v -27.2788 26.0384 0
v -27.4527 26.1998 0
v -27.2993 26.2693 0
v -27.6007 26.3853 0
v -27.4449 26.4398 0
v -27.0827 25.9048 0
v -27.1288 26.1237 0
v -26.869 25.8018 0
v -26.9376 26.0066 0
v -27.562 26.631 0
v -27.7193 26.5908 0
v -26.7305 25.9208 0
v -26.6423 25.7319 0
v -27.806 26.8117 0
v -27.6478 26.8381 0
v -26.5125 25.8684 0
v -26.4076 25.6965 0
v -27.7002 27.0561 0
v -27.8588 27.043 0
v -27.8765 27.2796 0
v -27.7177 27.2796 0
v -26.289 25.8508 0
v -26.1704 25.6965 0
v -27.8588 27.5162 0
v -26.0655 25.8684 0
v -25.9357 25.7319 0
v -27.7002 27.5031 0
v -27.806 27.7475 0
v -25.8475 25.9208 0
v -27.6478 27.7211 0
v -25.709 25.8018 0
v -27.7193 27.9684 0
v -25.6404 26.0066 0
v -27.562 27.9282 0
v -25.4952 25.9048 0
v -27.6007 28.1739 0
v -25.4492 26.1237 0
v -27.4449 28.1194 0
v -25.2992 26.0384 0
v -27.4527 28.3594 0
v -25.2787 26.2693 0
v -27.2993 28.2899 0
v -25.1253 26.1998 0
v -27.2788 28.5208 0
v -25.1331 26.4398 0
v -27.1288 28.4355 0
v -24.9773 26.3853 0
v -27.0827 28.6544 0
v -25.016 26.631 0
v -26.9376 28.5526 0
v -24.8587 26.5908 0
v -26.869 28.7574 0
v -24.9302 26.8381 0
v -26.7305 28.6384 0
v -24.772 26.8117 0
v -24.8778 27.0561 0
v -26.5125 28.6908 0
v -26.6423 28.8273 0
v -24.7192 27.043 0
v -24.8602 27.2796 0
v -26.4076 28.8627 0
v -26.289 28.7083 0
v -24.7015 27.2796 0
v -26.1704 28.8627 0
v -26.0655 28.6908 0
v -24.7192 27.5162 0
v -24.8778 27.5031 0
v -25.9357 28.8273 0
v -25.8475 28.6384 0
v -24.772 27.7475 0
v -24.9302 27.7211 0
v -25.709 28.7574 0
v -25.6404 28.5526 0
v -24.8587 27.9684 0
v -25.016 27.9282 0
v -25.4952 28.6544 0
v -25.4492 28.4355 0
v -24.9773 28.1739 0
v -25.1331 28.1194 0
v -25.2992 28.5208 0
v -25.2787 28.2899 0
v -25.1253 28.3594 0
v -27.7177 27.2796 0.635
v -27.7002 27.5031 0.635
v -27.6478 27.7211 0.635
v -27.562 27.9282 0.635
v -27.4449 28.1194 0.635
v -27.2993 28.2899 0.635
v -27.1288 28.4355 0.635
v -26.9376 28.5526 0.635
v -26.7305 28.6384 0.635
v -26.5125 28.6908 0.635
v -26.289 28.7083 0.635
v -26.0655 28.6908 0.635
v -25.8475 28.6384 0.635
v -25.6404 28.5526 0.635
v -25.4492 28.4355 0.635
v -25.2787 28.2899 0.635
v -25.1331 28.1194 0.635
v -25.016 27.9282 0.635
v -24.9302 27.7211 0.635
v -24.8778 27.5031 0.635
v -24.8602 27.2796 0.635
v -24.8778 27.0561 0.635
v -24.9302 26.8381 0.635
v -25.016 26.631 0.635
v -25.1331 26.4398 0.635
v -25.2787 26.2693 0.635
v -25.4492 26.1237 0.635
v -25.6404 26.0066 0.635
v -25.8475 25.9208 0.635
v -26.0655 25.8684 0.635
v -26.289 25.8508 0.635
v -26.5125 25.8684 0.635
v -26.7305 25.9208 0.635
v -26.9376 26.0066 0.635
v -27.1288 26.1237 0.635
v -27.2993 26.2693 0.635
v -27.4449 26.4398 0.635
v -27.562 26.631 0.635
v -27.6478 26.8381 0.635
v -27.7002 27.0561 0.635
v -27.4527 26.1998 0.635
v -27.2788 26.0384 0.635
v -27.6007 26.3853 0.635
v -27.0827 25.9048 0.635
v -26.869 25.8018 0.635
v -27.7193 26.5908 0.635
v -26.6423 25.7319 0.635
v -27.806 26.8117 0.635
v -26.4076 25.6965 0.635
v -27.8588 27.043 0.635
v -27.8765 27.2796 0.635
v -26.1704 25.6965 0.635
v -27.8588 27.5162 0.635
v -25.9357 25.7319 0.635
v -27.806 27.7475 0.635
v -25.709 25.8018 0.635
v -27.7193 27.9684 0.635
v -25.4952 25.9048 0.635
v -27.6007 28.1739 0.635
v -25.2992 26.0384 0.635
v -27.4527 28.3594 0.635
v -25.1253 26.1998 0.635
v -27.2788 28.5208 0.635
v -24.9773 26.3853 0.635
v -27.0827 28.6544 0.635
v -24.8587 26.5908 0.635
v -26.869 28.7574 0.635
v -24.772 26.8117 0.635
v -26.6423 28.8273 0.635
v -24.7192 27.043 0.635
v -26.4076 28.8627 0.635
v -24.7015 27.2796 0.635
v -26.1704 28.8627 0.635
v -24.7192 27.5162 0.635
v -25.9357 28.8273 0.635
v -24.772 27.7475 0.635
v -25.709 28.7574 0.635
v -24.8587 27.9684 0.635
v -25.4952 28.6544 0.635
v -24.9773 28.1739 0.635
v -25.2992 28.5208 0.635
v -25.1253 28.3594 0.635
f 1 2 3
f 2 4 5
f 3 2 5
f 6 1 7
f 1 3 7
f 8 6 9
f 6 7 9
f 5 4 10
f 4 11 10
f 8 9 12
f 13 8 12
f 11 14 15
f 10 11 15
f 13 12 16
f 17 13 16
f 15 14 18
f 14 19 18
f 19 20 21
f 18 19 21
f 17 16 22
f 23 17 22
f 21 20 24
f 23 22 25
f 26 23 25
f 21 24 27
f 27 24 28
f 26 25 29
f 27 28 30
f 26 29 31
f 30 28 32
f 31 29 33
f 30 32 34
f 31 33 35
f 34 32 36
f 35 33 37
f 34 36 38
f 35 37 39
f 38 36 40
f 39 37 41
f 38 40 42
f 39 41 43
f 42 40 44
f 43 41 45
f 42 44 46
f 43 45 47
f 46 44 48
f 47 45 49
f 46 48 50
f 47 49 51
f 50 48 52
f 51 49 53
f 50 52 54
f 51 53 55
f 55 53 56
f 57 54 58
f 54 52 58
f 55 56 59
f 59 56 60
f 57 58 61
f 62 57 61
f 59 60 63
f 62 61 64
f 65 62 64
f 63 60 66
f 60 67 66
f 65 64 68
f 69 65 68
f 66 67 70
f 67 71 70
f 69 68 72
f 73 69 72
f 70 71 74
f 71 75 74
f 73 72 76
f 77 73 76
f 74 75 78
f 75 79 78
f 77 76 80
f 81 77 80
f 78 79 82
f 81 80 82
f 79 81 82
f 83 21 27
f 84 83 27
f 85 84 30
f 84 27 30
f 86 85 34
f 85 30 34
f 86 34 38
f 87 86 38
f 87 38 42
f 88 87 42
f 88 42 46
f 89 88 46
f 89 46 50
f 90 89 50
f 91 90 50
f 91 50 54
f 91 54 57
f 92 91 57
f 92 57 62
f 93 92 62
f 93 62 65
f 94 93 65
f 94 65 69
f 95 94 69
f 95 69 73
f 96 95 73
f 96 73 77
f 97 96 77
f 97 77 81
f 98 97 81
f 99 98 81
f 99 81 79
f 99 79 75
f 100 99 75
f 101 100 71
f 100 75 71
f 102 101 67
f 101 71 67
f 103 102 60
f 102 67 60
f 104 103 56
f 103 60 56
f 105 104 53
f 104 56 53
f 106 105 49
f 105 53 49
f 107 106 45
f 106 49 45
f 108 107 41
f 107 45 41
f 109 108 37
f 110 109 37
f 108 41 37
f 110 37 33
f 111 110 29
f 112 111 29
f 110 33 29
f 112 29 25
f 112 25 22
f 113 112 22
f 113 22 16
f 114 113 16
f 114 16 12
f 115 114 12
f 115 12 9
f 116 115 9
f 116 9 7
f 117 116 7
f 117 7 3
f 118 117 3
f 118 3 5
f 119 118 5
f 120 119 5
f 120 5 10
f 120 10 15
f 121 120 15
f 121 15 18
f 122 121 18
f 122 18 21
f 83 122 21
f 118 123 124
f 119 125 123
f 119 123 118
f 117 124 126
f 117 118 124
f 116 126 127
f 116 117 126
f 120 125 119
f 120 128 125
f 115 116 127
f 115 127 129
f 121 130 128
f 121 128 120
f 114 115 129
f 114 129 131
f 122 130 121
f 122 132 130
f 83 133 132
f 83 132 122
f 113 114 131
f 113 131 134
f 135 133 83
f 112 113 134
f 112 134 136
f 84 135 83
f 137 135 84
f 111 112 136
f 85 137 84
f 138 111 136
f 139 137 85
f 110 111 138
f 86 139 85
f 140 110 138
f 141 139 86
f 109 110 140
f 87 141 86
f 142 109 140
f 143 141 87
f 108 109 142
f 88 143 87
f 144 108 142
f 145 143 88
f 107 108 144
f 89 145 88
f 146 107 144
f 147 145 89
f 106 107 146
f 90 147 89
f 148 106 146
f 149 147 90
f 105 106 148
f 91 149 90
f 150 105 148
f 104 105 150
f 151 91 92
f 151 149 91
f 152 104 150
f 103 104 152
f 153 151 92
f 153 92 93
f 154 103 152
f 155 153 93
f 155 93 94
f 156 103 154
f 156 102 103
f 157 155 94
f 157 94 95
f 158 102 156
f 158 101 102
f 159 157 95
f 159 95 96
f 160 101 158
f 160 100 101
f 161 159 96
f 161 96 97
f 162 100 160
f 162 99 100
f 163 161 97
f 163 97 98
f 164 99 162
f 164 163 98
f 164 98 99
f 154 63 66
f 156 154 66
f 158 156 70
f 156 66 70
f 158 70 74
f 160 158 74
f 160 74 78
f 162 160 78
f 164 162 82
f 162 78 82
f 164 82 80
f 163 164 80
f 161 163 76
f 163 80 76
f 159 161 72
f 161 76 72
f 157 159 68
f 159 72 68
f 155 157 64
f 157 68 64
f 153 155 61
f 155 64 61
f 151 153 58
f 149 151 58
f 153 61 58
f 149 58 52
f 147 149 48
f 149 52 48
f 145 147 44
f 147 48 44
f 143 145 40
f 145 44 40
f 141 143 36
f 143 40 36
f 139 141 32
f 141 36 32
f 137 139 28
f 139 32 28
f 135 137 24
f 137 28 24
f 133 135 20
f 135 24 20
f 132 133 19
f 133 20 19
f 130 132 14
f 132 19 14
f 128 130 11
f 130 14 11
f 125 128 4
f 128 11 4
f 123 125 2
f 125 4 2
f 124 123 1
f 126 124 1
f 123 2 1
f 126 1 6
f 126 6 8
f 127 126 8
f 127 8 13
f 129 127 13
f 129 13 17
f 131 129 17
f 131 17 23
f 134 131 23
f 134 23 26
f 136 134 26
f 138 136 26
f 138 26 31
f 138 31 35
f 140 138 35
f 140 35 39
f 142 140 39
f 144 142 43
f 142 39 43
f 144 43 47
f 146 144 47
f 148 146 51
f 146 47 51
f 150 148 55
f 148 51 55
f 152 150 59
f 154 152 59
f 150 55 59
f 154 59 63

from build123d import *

# Parameters (mm, degrees)
F0_R     = 3.175
F1_DEPTH = 1.27
F3_D     = 5.715
F4_SCALE = 0.5


with BuildPart() as f1:
    # F0 (on Top) → F1 (new body)
    with BuildSketch(Plane.XY):
        with Locations((-52.5779984891, 54.5591972768)):
            Circle(F0_R)
    extrude(amount=F1_DEPTH)

    # F3 (through all)
    with Locations(Plane.XY.offset(1.27)):
        with Locations((-52.5779984891, 54.5591972768)):
            Hole(F3_D / 2)


with BuildPart() as f1_1:
    # F4: moved
    add(f1.part.scale(F4_SCALE))


solid = f1_1.part
